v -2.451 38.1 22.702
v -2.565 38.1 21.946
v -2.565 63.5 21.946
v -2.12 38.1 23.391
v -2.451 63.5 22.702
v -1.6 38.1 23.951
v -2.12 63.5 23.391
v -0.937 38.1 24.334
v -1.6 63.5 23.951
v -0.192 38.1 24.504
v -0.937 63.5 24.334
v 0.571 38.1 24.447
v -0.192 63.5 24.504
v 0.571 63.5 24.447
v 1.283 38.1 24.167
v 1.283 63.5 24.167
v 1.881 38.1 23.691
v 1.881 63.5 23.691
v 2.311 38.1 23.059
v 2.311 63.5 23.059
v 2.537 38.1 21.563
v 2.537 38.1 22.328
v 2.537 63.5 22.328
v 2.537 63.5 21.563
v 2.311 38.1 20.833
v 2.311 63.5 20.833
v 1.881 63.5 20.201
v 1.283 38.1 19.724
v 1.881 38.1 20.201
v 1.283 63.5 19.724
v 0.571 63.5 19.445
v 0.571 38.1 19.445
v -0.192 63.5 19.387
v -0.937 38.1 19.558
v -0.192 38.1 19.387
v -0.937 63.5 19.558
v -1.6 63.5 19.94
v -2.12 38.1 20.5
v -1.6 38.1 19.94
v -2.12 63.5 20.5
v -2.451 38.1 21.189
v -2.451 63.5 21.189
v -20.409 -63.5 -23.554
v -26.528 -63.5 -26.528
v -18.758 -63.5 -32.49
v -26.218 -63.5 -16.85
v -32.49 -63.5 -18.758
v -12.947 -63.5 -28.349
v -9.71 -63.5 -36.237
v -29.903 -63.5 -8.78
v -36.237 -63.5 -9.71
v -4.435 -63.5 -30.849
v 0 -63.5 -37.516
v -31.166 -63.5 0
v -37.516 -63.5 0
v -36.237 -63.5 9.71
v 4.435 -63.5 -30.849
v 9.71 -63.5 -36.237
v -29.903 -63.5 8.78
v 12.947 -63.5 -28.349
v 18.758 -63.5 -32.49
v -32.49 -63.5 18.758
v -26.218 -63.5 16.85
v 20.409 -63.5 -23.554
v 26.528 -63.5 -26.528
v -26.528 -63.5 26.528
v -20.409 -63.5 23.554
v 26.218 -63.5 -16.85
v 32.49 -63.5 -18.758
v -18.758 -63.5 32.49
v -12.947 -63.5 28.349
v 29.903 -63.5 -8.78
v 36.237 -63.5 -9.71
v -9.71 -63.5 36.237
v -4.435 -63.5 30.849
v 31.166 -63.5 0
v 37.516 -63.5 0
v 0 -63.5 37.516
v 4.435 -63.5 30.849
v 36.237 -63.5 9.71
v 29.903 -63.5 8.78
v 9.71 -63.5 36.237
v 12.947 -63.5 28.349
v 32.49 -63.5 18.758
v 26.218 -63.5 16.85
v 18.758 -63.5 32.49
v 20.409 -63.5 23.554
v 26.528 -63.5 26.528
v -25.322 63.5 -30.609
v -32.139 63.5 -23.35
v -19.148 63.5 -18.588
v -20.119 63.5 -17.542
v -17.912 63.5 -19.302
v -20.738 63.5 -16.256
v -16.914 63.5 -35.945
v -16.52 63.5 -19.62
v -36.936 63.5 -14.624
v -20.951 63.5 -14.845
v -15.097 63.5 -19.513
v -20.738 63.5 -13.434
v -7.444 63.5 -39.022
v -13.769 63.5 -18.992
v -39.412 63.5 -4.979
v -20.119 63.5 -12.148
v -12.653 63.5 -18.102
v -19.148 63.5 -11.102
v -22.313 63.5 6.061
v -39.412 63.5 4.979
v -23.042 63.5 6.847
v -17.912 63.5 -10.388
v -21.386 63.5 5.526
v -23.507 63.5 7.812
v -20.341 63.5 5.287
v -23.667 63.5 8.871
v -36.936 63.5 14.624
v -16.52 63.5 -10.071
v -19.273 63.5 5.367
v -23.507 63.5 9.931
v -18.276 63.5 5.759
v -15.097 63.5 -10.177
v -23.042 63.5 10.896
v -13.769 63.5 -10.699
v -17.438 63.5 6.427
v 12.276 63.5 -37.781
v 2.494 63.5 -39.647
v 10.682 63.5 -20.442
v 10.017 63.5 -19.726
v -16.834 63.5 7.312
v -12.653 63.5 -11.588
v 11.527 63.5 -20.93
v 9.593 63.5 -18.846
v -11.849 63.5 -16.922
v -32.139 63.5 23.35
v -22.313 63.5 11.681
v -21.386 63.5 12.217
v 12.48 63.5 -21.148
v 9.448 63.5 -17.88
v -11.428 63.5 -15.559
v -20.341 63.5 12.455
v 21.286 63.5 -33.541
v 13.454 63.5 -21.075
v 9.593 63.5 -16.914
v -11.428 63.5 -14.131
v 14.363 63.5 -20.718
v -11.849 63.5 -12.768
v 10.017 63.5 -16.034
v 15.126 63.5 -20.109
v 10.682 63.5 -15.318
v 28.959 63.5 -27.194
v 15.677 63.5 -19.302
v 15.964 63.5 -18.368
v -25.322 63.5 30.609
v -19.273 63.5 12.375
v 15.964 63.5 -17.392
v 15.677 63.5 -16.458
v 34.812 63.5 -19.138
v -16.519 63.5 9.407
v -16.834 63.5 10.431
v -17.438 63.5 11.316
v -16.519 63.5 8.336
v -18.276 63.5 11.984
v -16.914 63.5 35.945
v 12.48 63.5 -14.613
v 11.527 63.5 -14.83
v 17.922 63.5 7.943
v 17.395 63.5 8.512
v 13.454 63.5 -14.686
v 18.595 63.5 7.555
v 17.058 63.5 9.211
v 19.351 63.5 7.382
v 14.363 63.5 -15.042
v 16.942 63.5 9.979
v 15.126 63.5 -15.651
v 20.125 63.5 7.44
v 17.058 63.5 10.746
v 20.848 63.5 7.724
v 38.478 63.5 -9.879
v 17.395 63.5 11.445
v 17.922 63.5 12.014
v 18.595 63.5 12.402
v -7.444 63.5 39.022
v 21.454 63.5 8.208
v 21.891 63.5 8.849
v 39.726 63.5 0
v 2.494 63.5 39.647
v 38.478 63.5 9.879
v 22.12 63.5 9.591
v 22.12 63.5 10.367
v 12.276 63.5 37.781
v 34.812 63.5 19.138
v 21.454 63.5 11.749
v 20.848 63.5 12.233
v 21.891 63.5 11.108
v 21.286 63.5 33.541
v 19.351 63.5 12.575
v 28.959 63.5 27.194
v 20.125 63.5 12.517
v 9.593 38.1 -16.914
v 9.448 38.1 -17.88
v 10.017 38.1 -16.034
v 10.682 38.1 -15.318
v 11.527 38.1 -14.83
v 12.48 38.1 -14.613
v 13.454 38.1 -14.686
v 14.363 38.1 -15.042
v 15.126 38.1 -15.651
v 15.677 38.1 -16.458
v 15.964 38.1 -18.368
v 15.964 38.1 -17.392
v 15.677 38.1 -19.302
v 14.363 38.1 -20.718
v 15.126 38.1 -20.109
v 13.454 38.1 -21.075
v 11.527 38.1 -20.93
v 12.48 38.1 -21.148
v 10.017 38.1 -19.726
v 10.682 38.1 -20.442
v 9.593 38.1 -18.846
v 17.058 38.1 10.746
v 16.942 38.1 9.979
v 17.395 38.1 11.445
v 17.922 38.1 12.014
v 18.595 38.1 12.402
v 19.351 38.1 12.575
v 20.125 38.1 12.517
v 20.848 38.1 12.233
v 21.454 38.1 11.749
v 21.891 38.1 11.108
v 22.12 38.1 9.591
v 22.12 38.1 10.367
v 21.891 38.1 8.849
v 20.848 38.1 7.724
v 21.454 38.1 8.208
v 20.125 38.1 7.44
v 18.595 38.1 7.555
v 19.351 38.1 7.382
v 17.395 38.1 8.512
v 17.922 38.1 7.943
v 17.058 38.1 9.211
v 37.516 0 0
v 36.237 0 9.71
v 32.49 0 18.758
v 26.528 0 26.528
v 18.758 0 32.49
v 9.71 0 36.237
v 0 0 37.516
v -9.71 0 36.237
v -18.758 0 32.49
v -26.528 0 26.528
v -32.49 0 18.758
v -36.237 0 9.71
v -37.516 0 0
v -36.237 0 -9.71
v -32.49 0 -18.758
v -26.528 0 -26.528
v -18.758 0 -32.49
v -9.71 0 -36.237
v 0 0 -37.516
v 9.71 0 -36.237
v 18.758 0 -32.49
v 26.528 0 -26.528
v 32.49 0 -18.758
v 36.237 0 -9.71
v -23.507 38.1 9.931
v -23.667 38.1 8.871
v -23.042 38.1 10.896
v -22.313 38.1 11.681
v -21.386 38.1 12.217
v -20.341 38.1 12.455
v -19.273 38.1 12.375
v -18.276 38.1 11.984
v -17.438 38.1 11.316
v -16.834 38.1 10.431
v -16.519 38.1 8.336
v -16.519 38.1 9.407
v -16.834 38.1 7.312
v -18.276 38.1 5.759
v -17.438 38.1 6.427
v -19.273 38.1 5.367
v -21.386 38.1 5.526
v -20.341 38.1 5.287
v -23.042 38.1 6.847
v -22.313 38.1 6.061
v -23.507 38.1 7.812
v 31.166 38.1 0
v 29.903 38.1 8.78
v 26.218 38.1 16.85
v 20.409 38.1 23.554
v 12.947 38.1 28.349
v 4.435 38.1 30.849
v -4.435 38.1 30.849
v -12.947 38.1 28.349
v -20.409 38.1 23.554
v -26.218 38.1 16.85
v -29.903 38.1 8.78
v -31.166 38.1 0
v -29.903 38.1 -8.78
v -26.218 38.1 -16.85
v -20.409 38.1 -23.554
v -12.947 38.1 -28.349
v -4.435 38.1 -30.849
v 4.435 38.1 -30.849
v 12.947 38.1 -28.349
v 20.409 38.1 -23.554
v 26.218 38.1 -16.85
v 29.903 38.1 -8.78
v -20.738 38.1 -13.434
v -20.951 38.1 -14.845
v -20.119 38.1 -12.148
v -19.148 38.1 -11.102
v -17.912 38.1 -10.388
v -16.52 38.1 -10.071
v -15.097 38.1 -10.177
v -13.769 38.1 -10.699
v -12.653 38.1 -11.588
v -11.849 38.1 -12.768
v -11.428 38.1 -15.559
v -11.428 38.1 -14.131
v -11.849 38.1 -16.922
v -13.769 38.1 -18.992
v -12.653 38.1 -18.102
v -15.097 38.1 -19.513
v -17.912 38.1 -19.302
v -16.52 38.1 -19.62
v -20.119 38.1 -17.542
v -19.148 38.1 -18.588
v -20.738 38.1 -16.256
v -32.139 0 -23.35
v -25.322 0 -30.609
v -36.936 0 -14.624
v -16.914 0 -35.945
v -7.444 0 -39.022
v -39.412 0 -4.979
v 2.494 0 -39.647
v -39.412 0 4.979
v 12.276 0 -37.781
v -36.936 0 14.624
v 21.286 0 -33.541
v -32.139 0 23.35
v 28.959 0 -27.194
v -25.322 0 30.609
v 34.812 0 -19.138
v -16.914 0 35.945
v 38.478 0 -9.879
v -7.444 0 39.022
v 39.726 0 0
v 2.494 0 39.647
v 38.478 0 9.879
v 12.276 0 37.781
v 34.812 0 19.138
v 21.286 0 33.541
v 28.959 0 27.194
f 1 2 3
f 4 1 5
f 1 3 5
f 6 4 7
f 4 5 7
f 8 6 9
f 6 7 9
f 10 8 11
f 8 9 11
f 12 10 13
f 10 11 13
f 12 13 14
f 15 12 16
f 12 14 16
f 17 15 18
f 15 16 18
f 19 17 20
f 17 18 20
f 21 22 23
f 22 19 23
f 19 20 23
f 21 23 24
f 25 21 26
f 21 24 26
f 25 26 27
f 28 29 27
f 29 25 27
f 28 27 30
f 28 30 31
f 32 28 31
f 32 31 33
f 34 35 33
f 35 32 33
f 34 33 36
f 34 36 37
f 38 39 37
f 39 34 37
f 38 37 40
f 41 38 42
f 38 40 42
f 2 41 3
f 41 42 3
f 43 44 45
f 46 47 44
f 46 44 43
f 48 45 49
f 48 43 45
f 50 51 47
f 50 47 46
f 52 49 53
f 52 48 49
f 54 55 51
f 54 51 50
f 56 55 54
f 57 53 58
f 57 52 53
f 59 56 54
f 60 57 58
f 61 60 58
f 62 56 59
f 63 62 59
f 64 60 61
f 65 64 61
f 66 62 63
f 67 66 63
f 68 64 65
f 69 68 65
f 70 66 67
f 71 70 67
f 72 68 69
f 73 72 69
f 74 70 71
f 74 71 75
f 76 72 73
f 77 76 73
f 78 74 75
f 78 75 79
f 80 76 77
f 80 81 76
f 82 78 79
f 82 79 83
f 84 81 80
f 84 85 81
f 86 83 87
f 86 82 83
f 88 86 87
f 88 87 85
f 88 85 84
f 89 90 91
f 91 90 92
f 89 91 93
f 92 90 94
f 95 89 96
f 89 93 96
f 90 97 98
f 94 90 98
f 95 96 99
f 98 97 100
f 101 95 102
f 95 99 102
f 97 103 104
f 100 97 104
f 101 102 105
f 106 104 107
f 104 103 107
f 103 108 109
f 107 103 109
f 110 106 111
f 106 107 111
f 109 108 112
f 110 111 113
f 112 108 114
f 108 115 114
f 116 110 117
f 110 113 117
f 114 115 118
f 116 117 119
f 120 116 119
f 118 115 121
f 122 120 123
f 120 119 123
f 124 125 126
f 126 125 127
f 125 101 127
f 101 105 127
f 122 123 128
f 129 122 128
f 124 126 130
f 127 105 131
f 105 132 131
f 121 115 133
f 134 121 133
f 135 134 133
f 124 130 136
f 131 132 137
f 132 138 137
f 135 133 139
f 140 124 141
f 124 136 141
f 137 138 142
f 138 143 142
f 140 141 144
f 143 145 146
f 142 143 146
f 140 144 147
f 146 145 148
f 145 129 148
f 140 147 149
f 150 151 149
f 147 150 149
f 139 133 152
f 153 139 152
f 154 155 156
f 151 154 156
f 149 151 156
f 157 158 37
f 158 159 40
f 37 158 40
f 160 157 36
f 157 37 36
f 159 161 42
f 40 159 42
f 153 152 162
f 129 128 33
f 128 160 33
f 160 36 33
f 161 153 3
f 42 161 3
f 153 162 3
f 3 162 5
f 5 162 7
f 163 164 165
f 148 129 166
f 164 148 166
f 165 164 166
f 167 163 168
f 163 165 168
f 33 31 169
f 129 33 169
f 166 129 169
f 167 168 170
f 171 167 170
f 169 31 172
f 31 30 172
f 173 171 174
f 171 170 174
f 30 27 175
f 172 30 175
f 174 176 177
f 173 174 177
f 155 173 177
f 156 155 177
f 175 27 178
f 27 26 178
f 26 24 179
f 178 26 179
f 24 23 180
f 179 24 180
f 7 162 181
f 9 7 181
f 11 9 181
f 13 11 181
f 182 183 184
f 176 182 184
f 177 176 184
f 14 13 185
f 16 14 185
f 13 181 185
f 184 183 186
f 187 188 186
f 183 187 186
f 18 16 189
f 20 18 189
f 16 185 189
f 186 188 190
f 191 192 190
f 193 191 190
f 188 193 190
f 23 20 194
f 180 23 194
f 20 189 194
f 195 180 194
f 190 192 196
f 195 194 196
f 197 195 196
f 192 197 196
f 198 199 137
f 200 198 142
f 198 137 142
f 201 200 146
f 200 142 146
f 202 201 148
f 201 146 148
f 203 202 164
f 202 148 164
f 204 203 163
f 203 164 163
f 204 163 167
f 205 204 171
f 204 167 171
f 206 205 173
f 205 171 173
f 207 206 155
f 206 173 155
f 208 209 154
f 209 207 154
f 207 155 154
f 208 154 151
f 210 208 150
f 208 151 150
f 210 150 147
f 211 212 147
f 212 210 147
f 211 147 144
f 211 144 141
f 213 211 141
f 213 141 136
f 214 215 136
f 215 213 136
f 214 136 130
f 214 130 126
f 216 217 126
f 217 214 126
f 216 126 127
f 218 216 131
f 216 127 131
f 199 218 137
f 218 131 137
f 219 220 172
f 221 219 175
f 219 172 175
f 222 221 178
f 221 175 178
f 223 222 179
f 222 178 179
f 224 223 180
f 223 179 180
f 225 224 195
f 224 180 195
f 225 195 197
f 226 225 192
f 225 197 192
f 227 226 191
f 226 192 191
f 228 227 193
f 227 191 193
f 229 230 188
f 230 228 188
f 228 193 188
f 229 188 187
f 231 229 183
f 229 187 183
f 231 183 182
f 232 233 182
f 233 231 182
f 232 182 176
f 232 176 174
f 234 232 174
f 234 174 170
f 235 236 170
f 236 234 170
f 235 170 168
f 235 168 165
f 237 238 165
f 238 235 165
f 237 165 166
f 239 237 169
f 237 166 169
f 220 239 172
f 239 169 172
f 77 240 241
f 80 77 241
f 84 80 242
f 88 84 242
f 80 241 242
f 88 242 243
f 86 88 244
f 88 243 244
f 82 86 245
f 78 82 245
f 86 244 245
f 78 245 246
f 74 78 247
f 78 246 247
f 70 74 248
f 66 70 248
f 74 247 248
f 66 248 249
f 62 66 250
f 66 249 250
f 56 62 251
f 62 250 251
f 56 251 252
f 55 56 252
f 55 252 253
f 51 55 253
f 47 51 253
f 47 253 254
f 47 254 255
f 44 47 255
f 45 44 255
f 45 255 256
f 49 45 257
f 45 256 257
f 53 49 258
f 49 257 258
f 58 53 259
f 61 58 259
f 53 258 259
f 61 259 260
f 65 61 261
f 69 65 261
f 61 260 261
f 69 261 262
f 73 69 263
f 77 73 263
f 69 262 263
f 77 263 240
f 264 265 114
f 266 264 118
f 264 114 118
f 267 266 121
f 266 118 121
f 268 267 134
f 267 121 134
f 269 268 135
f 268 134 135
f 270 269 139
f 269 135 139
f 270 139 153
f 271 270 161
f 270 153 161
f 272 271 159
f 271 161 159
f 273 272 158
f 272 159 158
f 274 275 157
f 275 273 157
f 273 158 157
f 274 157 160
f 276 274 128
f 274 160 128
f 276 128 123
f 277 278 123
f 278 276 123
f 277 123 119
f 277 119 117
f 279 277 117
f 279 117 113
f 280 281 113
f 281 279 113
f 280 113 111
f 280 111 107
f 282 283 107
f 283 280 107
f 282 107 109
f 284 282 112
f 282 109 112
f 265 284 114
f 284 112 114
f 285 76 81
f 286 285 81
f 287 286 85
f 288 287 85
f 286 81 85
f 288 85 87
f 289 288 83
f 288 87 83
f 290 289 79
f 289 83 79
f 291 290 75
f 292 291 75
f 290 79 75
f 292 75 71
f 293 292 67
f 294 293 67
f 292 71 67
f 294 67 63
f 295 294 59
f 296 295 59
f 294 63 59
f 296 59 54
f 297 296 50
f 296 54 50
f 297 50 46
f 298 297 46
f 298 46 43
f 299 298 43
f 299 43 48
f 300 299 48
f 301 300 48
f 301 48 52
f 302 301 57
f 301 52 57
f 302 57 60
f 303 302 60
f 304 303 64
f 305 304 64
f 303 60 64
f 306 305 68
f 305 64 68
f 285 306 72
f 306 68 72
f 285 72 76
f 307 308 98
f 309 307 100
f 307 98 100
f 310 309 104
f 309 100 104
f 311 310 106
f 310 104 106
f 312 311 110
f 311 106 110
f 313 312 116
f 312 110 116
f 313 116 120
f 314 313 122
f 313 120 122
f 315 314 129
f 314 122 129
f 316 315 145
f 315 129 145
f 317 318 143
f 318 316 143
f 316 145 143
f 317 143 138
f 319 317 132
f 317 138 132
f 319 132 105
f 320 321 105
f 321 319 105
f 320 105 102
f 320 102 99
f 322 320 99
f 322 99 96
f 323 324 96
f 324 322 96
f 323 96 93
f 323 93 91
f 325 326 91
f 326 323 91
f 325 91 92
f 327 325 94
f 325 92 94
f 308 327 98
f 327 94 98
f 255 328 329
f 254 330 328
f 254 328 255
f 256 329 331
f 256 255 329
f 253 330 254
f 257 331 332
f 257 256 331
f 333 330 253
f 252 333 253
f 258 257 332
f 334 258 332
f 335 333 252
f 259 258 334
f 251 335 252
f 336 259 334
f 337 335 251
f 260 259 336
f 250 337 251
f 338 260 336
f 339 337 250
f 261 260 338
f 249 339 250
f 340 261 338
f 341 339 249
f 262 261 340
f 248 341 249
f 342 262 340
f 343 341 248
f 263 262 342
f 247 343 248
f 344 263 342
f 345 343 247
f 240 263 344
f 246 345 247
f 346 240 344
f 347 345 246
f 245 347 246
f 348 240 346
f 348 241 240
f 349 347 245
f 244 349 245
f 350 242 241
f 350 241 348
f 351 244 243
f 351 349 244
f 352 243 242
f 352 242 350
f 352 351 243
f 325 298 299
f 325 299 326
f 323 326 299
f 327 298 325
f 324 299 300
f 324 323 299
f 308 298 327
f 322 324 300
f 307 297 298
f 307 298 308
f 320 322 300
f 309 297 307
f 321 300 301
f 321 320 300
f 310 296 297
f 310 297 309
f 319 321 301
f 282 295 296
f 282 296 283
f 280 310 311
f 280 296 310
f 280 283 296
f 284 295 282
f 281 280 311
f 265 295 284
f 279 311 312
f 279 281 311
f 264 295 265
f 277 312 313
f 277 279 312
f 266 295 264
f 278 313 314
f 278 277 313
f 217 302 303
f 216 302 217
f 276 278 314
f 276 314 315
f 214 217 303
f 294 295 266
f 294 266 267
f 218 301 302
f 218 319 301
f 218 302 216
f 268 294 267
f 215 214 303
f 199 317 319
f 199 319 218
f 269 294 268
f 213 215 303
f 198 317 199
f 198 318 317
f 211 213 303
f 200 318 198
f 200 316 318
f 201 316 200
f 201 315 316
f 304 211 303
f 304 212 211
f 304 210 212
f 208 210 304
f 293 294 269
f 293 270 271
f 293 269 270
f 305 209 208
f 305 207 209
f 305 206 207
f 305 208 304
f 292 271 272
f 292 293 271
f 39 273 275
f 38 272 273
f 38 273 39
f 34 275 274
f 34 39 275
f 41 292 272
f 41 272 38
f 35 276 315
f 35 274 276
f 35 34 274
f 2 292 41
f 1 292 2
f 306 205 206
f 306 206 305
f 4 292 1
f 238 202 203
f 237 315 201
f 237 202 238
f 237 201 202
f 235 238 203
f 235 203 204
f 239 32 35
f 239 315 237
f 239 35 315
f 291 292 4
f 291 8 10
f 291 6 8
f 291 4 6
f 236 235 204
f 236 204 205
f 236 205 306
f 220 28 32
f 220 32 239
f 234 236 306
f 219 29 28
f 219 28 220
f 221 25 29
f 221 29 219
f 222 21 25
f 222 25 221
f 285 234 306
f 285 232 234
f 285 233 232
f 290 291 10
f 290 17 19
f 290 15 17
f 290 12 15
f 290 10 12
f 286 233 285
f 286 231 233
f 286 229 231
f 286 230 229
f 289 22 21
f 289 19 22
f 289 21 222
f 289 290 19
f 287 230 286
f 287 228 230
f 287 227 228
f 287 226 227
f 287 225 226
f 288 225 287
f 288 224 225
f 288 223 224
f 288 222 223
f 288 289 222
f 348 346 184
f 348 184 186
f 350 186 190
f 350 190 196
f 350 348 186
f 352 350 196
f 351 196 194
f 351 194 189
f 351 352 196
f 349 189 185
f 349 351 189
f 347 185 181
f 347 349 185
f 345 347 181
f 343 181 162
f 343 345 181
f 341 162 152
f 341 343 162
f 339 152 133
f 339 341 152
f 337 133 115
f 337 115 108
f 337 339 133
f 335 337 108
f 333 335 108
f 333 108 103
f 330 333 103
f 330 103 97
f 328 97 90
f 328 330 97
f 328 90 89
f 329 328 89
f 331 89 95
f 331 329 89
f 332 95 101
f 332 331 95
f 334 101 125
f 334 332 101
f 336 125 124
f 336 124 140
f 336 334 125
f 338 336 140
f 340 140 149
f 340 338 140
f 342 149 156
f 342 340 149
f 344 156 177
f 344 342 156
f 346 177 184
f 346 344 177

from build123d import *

# Parameters (mm, degrees)
F0_R     = 37.5158
F2_DEPTH = 63.5
F1_R     = 39.7256
F3_DEPTH = 63.5
F4_R     = 2.5654
F4_R_2   = 2.6035
F4_R_3   = 3.5941
F4_R_4   = 3.2766
F4_R_5   = 4.7879
F5_DEPTH = 127.001
F6_R     = 31.165799
F6_R_2   = 4.7879
F6_R_3   = 3.2766
F6_R_4   = 3.5941
F6_R_5   = 2.6035
F6_R_6   = 2.5654
F7_DEPTH = 101.6


with BuildPart() as f2:
    # F0 (on Front) → F2 (new body)
    with BuildSketch(Plane.XZ):
        Circle(F0_R)
    extrude(amount=F2_DEPTH)

    # F1 (on Front) → F3 (join)
    with BuildSketch(Plane.XZ):
        Circle(F1_R)
    extrude(amount=-F3_DEPTH)

    # F4 (on face) → F5 (cut, through all)
    with BuildSketch(Plane(origin=(0, 63.5, 0), x_dir=(-1, 0, 0), z_dir=(0, 1, 0))):
        with Locations((0, 21.9456)):
            Circle(F4_R)
        with Locations((-19.545753, 9.978621)):
            Circle(F4_R_2)
        with Locations((20.072576, 8.871361)):
            Circle(F4_R_3)
        with Locations((-12.724472, -17.880078)):
            Circle(F4_R_4)
        with Locations((16.162698, -14.845085)):
            Circle(F4_R_5)
    extrude(amount=-F5_DEPTH, mode=Mode.SUBTRACT)

    # F6 (on face) → F7 (cut)
    with BuildSketch(Plane.XZ.offset(63.5)):
        Circle(F6_R)
        with Locations((-16.162698, -14.845085)):
            Circle(F6_R_2, mode=Mode.SUBTRACT)
        with Locations((12.724472, -17.880078)):
            Circle(F6_R_3, mode=Mode.SUBTRACT)
        with Locations((-20.072576, 8.871361)):
            Circle(F6_R_4, mode=Mode.SUBTRACT)
        with Locations((19.545753, 9.978621)):
            Circle(F6_R_5, mode=Mode.SUBTRACT)
        with Locations((0, 21.9456)):
            Circle(F6_R_6, mode=Mode.SUBTRACT)
    extrude(amount=-F7_DEPTH, mode=Mode.SUBTRACT)


solid = f2.part
